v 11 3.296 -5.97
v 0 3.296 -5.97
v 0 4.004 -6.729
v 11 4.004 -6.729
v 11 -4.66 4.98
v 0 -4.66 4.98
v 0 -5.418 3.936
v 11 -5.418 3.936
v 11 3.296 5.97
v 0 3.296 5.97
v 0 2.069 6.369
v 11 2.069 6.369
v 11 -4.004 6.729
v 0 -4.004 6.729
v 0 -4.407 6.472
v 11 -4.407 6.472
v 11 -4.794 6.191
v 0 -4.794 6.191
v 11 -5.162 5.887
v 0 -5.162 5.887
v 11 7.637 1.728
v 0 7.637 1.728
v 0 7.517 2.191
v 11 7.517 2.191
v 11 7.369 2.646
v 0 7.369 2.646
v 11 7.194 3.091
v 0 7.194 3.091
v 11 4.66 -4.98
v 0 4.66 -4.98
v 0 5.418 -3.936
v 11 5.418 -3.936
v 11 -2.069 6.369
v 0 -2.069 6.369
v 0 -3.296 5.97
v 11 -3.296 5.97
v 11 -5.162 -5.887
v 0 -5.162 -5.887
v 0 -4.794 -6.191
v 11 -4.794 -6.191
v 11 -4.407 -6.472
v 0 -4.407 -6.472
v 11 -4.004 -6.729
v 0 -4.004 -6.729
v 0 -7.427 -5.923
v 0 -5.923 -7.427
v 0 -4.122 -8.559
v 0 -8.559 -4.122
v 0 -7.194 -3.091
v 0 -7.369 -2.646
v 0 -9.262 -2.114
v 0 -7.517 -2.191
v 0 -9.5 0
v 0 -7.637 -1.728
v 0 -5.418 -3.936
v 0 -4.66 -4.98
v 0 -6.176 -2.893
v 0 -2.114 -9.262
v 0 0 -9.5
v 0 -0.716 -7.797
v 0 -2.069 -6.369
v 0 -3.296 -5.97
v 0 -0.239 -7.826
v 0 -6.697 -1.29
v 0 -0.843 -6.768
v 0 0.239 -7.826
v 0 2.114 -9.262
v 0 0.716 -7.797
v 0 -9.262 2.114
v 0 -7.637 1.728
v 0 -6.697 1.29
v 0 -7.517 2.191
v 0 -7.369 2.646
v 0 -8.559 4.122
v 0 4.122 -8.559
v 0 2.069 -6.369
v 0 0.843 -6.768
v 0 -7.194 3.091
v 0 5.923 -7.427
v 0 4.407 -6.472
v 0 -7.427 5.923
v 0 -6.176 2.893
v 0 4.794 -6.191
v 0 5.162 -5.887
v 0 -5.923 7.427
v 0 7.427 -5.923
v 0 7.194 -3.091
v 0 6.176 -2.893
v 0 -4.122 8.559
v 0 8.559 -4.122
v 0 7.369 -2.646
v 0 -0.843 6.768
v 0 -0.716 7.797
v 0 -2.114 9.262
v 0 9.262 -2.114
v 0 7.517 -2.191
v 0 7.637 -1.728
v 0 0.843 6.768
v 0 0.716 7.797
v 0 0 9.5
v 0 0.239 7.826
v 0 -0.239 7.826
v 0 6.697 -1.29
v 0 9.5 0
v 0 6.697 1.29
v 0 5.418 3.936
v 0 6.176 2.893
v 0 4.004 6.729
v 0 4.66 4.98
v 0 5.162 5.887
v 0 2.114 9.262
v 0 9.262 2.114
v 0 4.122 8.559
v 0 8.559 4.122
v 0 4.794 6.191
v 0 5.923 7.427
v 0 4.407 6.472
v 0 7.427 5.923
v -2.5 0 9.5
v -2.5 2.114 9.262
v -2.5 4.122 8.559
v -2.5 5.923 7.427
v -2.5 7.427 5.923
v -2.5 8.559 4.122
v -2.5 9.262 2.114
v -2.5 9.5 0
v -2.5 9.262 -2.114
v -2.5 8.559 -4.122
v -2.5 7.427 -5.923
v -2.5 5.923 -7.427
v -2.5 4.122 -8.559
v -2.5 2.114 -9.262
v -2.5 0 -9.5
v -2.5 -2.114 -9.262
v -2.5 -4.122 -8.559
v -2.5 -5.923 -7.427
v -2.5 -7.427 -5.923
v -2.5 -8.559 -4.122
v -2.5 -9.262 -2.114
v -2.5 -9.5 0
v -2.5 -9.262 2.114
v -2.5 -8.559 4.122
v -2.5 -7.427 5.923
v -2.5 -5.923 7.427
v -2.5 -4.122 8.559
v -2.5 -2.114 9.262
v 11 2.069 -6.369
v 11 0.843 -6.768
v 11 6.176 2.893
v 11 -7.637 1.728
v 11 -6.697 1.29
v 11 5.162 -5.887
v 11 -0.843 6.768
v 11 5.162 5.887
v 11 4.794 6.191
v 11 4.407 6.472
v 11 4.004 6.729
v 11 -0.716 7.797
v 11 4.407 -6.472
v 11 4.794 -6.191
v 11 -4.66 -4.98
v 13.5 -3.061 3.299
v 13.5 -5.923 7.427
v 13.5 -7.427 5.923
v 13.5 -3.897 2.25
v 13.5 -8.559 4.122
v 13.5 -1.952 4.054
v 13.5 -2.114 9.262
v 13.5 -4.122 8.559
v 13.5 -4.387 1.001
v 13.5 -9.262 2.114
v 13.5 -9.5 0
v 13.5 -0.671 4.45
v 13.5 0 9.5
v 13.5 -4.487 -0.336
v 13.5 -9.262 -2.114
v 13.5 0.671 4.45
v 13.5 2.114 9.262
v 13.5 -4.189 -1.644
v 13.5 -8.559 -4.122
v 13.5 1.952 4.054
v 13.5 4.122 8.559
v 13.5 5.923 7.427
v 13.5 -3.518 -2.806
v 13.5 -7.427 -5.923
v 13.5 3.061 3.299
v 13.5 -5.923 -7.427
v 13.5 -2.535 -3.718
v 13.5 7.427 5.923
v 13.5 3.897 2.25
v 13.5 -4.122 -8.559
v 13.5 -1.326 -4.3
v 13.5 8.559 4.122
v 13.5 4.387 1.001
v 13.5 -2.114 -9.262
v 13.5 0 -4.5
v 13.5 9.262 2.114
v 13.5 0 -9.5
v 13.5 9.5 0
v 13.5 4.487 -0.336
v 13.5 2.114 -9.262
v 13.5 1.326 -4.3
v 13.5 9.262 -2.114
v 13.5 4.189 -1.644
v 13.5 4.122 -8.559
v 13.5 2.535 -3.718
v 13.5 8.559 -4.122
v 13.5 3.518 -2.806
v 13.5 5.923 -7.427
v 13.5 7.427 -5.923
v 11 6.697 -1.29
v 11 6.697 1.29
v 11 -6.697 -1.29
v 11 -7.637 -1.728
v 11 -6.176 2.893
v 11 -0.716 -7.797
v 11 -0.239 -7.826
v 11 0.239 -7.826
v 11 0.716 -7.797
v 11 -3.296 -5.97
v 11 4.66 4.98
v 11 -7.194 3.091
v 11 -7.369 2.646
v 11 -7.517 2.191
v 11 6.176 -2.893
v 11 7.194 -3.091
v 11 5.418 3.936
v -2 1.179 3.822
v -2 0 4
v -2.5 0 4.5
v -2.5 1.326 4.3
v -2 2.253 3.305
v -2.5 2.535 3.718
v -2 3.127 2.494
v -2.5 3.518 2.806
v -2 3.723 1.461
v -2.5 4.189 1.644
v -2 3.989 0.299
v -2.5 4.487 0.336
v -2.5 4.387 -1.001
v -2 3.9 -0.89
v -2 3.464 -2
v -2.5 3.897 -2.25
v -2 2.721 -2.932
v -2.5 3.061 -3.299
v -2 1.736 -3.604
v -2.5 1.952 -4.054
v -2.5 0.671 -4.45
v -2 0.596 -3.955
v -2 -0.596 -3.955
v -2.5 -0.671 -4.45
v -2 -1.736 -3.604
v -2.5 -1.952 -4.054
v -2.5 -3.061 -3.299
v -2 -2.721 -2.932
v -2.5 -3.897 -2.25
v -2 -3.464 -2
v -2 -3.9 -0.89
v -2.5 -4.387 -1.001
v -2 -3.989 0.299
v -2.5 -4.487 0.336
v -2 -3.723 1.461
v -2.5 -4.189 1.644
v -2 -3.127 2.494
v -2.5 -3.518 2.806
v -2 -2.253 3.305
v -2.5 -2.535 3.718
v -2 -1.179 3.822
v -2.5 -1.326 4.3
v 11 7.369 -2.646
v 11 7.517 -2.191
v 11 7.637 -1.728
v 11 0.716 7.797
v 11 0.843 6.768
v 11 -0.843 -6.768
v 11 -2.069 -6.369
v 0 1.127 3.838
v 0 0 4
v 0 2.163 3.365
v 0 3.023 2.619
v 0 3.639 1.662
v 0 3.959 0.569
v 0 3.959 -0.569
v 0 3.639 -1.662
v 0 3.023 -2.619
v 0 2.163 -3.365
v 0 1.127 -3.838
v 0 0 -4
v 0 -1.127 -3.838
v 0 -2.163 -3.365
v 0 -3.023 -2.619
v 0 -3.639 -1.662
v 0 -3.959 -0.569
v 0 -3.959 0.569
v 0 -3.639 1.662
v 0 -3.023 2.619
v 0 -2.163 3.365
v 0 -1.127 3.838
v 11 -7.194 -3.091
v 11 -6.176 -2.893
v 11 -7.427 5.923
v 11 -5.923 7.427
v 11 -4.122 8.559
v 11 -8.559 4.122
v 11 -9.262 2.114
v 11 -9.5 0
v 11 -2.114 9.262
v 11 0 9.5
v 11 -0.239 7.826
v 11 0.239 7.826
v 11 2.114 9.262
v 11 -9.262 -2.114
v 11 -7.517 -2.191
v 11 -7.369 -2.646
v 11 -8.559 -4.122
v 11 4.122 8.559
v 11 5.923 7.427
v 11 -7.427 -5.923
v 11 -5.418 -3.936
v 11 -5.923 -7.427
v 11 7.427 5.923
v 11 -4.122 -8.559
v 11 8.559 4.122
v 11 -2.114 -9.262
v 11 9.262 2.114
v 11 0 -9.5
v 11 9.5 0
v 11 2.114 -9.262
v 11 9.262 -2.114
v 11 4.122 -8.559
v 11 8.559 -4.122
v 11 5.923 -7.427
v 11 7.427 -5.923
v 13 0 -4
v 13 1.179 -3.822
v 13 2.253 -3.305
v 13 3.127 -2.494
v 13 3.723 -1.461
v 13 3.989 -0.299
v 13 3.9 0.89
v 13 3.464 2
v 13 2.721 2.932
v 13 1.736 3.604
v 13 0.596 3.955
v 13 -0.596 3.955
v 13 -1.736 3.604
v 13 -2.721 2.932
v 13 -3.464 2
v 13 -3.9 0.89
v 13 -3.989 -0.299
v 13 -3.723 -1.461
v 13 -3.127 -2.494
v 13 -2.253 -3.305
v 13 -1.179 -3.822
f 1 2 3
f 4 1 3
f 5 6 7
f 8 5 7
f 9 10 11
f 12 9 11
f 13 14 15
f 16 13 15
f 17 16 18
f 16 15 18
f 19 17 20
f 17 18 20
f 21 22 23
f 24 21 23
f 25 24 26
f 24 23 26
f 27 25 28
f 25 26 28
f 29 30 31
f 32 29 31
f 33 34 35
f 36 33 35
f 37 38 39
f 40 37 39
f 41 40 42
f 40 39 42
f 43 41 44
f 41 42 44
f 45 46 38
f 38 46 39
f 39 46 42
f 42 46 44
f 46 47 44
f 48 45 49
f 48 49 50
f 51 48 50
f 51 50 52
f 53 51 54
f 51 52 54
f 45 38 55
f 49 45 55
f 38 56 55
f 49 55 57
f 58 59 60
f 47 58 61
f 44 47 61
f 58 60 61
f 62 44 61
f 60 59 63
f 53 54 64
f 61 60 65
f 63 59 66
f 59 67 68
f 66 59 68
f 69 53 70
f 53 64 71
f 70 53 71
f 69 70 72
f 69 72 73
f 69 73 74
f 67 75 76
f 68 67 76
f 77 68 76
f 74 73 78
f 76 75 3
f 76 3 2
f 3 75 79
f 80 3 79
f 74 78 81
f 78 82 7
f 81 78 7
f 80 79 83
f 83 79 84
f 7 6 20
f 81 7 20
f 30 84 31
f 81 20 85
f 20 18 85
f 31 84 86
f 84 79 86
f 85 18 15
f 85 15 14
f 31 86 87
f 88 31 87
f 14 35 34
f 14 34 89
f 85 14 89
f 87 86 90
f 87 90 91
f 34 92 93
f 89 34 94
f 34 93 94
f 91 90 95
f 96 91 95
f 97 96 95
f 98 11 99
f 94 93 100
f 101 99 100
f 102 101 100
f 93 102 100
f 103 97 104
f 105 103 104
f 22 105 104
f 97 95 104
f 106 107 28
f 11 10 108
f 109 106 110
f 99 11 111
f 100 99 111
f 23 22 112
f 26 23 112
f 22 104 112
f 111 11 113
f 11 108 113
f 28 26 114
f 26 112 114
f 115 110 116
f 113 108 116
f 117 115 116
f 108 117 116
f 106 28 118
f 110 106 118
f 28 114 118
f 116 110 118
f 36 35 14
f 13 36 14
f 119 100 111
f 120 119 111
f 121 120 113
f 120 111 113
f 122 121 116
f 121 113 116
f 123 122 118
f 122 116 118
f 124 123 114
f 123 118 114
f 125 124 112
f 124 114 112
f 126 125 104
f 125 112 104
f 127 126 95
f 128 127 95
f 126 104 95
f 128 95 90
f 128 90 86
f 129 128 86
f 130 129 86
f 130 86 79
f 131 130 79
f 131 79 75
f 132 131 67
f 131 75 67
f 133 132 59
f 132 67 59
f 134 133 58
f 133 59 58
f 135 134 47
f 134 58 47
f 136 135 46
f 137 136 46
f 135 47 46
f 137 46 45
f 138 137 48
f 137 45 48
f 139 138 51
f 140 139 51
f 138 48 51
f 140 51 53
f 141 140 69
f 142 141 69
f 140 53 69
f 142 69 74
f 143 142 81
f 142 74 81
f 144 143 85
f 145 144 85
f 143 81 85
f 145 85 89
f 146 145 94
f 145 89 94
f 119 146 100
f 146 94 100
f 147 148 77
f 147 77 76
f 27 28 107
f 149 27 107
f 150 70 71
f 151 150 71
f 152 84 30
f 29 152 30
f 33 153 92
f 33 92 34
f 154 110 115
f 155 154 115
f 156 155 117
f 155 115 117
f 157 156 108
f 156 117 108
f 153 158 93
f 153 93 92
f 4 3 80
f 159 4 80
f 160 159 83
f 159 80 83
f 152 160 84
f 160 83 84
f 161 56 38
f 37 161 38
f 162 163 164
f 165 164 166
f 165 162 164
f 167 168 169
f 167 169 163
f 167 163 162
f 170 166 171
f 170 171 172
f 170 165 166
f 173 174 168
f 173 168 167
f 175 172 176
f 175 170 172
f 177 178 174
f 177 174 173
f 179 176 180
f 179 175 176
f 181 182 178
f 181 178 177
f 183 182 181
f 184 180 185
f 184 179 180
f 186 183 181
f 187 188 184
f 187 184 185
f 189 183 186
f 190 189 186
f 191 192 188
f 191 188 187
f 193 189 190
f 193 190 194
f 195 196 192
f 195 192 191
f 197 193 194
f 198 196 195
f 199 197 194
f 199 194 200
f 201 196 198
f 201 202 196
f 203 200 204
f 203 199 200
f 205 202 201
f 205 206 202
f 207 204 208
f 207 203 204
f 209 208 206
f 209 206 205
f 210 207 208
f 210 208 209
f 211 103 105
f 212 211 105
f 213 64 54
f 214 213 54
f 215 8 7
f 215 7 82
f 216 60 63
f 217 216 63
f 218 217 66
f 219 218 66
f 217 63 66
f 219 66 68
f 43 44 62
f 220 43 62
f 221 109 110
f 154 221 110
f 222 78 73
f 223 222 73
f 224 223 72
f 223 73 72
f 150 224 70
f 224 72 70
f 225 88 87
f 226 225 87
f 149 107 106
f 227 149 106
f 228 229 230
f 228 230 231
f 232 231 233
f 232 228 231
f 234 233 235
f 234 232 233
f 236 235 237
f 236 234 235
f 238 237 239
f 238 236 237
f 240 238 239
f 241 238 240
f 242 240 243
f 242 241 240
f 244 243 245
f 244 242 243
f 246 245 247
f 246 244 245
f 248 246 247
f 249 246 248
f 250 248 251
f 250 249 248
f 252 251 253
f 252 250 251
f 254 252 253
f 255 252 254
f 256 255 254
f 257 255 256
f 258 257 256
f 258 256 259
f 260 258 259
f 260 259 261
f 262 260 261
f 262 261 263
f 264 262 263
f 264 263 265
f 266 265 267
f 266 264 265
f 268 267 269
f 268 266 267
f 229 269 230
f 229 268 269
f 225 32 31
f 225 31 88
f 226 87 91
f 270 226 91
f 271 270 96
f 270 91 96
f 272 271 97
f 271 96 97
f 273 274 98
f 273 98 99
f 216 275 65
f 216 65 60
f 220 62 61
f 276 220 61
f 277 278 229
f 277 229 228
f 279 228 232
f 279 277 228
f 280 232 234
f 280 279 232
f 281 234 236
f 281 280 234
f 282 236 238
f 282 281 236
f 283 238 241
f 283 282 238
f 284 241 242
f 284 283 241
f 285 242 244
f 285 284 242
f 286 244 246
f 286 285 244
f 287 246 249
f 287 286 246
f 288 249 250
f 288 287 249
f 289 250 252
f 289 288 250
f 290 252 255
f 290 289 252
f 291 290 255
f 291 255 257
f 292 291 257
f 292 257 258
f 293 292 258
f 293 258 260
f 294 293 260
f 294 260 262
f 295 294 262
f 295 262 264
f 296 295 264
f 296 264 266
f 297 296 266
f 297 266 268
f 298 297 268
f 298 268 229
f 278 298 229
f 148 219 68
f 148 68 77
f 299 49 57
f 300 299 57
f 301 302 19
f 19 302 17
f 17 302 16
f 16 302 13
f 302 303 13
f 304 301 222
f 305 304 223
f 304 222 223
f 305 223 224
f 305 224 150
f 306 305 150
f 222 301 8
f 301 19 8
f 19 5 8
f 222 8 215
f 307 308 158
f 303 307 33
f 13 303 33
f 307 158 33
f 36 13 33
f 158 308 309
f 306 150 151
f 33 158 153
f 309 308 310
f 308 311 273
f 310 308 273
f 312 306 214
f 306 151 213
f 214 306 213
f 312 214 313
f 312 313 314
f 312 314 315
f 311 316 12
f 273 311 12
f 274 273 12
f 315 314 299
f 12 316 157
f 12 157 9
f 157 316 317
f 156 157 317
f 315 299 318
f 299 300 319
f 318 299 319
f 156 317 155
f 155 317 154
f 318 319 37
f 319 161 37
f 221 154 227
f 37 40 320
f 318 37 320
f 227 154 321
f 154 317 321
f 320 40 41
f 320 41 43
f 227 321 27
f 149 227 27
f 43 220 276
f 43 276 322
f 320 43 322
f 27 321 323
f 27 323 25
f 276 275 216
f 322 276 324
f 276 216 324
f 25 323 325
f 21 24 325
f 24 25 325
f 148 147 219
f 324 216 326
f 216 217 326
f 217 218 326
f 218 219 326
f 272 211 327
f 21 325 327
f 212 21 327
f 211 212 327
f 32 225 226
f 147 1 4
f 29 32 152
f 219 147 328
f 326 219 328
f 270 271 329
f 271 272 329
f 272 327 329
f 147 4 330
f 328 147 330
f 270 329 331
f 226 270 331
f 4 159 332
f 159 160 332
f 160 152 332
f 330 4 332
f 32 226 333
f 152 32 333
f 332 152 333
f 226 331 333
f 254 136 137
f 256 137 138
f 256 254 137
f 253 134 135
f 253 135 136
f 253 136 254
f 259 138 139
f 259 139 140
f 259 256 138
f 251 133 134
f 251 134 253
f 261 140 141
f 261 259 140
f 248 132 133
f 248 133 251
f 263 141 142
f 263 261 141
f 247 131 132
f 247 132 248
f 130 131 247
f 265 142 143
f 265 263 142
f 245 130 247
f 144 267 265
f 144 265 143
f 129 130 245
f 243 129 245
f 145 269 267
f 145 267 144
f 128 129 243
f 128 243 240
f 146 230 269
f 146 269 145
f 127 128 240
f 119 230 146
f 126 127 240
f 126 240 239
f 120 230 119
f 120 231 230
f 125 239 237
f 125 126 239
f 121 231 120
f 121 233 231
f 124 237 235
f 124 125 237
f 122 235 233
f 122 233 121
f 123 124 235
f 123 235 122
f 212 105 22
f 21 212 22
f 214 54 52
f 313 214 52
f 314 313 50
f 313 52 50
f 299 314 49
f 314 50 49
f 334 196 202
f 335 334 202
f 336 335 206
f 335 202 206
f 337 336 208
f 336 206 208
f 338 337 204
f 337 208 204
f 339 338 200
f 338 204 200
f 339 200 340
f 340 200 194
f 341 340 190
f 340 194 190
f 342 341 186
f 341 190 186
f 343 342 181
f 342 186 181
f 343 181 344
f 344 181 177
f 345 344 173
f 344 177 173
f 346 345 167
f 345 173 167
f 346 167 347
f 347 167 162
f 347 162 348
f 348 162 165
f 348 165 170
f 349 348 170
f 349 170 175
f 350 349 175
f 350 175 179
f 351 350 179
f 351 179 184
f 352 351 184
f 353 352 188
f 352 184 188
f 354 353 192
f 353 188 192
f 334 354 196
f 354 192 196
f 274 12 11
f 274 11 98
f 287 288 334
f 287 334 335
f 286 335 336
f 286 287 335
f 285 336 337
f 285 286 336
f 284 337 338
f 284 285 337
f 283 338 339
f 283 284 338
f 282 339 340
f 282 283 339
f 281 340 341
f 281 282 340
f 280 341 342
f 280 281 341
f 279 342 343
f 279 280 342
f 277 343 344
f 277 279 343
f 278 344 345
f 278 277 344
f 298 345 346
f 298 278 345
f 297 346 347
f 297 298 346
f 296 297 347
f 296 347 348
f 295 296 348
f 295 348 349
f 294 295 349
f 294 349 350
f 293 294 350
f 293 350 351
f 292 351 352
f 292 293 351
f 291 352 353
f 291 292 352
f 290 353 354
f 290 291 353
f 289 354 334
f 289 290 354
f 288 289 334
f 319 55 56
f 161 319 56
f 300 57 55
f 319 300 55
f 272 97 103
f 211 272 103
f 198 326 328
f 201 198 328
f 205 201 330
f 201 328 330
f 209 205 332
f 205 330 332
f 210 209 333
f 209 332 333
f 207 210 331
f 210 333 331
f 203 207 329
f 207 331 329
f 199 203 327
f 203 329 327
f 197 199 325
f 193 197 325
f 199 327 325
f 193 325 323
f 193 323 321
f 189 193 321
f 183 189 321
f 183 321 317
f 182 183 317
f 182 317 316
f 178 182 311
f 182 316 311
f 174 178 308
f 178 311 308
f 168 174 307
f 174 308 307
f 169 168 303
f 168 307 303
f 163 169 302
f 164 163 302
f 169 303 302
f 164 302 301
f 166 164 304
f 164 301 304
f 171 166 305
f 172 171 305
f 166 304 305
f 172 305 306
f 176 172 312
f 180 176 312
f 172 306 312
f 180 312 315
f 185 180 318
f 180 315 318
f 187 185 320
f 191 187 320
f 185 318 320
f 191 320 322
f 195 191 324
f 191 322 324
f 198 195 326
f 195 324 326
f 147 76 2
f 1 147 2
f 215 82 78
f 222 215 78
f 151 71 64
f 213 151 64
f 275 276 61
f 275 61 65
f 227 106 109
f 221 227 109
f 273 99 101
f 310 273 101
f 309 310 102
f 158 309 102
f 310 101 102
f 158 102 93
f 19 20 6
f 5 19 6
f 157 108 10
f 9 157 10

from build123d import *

# Parameters (mm, degrees)
SKETCH_1_R      = 4
EXTRUDE_1_DEPTH = 11
SKETCH_2_R      = 9.5
SKETCH_2_R_2    = 4
EXTRUDE_2_DEPTH = 2.5
SKETCH_3_R      = 9.5
SKETCH_3_R_2    = 4
EXTRUDE_3_DEPTH = 2.5
CHAMFER_1_SIZE  = 0.5


with BuildPart() as part:
    # 草图1 → 凸台-拉伸1 (new body)
    with BuildSketch(Plane(origin=(0, 0, 0), x_dir=(0, 0, -1), z_dir=(1, 0, 0))):
        with BuildLine():
            Line((1.728321742, 7.636871346), (1.29, 6.696887337))
            Line((1.29, 6.696887337), (0, 6.696887337))
            Line((0, 6.696887337), (-1.29, 6.696887337))
            Line((-1.29, 6.696887337), (-1.728321742, 7.636871346))
            ThreePointArc((-1.728321742, 7.636871346), (-2.419603066, 7.446772523), (-3.09059869, 7.194240734))
            Line((-3.09059869, 7.194240734), (-2.89269969, 6.17613864))
            Line((-2.89269969, 6.17613864), (-3.936331613, 5.417895665))
            Line((-3.936331613, 5.417895665), (-4.979963536, 4.659652689))
            Line((-4.979963536, 4.659652689), (-5.887082012, 5.162476672))
            ThreePointArc((-5.887082012, 5.162476672), (-6.334603066, 4.602358525), (-6.729015468, 4.003654685))
            Line((-6.729015468, 4.003654685), (-5.970486418, 3.296314902))
            Line((-5.970486418, 3.296314902), (-6.36911834, 2.069451996))
            Line((-6.36911834, 2.069451996), (-6.767750263, 0.84258909))
            Line((-6.767750263, 0.84258909), (-7.797177048, 0.716191375))
            ThreePointArc((-7.797177048, 0.716191375), (-7.83, 0), (-7.797177048, -0.716191375))
            Line((-7.797177048, -0.716191375), (-6.767750263, -0.84258909))
            Line((-6.767750263, -0.84258909), (-6.36911834, -2.069451996))
            Line((-6.36911834, -2.069451996), (-5.970486418, -3.296314902))
            Line((-5.970486418, -3.296314902), (-6.729015468, -4.003654685))
            ThreePointArc((-6.729015468, -4.003654685), (-6.334603066, -4.602358525), (-5.887082012, -5.162476672))
            Line((-5.887082012, -5.162476672), (-4.979963536, -4.659652689))
            Line((-4.979963536, -4.659652689), (-3.936331613, -5.417895665))
            Line((-3.936331613, -5.417895665), (-2.89269969, -6.17613864))
            Line((-2.89269969, -6.17613864), (-3.09059869, -7.194240734))
            ThreePointArc((-3.09059869, -7.194240734), (-2.419603066, -7.446772523), (-1.728321742, -7.636871346))
            Line((-1.728321742, -7.636871346), (-1.29, -6.696887337))
            Line((-1.29, -6.696887337), (0, -6.696887337))
            Line((0, -6.696887337), (1.29, -6.696887337))
            Line((1.29, -6.696887337), (1.728321742, -7.636871346))
            ThreePointArc((1.728321742, -7.636871346), (2.419603066, -7.446772523), (3.09059869, -7.194240734))
            Line((3.09059869, -7.194240734), (2.89269969, -6.17613864))
            Line((2.89269969, -6.17613864), (3.936331613, -5.417895665))
            Line((3.936331613, -5.417895665), (4.979963536, -4.659652689))
            Line((4.979963536, -4.659652689), (5.887082012, -5.162476672))
            ThreePointArc((5.887082012, -5.162476672), (6.334603066, -4.602358525), (6.729015468, -4.003654685))
            Line((6.729015468, -4.003654685), (5.970486418, -3.296314902))
            Line((5.970486418, -3.296314902), (6.36911834, -2.069451996))
            Line((6.36911834, -2.069451996), (6.767750263, -0.84258909))
            Line((6.767750263, -0.84258909), (7.797177048, -0.716191375))
            ThreePointArc((7.797177048, -0.716191375), (7.83, 0), (7.797177048, 0.716191375))
            Line((7.797177048, 0.716191375), (6.767750263, 0.84258909))
            Line((6.767750263, 0.84258909), (6.36911834, 2.069451996))
            Line((6.36911834, 2.069451996), (5.970486418, 3.296314902))
            Line((5.970486418, 3.296314902), (6.729015468, 4.003654685))
            ThreePointArc((6.729015468, 4.003654685), (6.334603066, 4.602358525), (5.887082012, 5.162476672))
            Line((5.887082012, 5.162476672), (4.979963536, 4.659652689))
            Line((4.979963536, 4.659652689), (3.936331613, 5.417895665))
            Line((3.936331613, 5.417895665), (2.89269969, 6.17613864))
            Line((2.89269969, 6.17613864), (3.09059869, 7.194240734))
            ThreePointArc((3.09059869, 7.194240734), (2.419603066, 7.446772523), (1.728321742, 7.636871346))
        make_face()
        Circle(SKETCH_1_R, mode=Mode.SUBTRACT)
    extrude(amount=EXTRUDE_1_DEPTH)

    # 草图2 → 凸台-拉伸2 (add)
    with BuildSketch(Plane(origin=(11, 0, 0), x_dir=(0, 0, -1), z_dir=(1, 0, 0))):
        Circle(SKETCH_2_R)
        Circle(SKETCH_2_R_2, mode=Mode.SUBTRACT)
    extrude(amount=EXTRUDE_2_DEPTH)

    # 草图3 → 凸台-拉伸3 (add)
    with BuildSketch(Plane.ZY):
        Circle(SKETCH_3_R)
        Circle(SKETCH_3_R_2, mode=Mode.SUBTRACT)
    extrude(amount=EXTRUDE_3_DEPTH)

    # 倒角1
    chamfer_1_edges = [part.edges().sort_by_distance(p)[0] for p in [
        (13.5, 0, 4),
        (-2.5, 0, -4),
    ]]
    chamfer(chamfer_1_edges, length=CHAMFER_1_SIZE)


solid = part.part
